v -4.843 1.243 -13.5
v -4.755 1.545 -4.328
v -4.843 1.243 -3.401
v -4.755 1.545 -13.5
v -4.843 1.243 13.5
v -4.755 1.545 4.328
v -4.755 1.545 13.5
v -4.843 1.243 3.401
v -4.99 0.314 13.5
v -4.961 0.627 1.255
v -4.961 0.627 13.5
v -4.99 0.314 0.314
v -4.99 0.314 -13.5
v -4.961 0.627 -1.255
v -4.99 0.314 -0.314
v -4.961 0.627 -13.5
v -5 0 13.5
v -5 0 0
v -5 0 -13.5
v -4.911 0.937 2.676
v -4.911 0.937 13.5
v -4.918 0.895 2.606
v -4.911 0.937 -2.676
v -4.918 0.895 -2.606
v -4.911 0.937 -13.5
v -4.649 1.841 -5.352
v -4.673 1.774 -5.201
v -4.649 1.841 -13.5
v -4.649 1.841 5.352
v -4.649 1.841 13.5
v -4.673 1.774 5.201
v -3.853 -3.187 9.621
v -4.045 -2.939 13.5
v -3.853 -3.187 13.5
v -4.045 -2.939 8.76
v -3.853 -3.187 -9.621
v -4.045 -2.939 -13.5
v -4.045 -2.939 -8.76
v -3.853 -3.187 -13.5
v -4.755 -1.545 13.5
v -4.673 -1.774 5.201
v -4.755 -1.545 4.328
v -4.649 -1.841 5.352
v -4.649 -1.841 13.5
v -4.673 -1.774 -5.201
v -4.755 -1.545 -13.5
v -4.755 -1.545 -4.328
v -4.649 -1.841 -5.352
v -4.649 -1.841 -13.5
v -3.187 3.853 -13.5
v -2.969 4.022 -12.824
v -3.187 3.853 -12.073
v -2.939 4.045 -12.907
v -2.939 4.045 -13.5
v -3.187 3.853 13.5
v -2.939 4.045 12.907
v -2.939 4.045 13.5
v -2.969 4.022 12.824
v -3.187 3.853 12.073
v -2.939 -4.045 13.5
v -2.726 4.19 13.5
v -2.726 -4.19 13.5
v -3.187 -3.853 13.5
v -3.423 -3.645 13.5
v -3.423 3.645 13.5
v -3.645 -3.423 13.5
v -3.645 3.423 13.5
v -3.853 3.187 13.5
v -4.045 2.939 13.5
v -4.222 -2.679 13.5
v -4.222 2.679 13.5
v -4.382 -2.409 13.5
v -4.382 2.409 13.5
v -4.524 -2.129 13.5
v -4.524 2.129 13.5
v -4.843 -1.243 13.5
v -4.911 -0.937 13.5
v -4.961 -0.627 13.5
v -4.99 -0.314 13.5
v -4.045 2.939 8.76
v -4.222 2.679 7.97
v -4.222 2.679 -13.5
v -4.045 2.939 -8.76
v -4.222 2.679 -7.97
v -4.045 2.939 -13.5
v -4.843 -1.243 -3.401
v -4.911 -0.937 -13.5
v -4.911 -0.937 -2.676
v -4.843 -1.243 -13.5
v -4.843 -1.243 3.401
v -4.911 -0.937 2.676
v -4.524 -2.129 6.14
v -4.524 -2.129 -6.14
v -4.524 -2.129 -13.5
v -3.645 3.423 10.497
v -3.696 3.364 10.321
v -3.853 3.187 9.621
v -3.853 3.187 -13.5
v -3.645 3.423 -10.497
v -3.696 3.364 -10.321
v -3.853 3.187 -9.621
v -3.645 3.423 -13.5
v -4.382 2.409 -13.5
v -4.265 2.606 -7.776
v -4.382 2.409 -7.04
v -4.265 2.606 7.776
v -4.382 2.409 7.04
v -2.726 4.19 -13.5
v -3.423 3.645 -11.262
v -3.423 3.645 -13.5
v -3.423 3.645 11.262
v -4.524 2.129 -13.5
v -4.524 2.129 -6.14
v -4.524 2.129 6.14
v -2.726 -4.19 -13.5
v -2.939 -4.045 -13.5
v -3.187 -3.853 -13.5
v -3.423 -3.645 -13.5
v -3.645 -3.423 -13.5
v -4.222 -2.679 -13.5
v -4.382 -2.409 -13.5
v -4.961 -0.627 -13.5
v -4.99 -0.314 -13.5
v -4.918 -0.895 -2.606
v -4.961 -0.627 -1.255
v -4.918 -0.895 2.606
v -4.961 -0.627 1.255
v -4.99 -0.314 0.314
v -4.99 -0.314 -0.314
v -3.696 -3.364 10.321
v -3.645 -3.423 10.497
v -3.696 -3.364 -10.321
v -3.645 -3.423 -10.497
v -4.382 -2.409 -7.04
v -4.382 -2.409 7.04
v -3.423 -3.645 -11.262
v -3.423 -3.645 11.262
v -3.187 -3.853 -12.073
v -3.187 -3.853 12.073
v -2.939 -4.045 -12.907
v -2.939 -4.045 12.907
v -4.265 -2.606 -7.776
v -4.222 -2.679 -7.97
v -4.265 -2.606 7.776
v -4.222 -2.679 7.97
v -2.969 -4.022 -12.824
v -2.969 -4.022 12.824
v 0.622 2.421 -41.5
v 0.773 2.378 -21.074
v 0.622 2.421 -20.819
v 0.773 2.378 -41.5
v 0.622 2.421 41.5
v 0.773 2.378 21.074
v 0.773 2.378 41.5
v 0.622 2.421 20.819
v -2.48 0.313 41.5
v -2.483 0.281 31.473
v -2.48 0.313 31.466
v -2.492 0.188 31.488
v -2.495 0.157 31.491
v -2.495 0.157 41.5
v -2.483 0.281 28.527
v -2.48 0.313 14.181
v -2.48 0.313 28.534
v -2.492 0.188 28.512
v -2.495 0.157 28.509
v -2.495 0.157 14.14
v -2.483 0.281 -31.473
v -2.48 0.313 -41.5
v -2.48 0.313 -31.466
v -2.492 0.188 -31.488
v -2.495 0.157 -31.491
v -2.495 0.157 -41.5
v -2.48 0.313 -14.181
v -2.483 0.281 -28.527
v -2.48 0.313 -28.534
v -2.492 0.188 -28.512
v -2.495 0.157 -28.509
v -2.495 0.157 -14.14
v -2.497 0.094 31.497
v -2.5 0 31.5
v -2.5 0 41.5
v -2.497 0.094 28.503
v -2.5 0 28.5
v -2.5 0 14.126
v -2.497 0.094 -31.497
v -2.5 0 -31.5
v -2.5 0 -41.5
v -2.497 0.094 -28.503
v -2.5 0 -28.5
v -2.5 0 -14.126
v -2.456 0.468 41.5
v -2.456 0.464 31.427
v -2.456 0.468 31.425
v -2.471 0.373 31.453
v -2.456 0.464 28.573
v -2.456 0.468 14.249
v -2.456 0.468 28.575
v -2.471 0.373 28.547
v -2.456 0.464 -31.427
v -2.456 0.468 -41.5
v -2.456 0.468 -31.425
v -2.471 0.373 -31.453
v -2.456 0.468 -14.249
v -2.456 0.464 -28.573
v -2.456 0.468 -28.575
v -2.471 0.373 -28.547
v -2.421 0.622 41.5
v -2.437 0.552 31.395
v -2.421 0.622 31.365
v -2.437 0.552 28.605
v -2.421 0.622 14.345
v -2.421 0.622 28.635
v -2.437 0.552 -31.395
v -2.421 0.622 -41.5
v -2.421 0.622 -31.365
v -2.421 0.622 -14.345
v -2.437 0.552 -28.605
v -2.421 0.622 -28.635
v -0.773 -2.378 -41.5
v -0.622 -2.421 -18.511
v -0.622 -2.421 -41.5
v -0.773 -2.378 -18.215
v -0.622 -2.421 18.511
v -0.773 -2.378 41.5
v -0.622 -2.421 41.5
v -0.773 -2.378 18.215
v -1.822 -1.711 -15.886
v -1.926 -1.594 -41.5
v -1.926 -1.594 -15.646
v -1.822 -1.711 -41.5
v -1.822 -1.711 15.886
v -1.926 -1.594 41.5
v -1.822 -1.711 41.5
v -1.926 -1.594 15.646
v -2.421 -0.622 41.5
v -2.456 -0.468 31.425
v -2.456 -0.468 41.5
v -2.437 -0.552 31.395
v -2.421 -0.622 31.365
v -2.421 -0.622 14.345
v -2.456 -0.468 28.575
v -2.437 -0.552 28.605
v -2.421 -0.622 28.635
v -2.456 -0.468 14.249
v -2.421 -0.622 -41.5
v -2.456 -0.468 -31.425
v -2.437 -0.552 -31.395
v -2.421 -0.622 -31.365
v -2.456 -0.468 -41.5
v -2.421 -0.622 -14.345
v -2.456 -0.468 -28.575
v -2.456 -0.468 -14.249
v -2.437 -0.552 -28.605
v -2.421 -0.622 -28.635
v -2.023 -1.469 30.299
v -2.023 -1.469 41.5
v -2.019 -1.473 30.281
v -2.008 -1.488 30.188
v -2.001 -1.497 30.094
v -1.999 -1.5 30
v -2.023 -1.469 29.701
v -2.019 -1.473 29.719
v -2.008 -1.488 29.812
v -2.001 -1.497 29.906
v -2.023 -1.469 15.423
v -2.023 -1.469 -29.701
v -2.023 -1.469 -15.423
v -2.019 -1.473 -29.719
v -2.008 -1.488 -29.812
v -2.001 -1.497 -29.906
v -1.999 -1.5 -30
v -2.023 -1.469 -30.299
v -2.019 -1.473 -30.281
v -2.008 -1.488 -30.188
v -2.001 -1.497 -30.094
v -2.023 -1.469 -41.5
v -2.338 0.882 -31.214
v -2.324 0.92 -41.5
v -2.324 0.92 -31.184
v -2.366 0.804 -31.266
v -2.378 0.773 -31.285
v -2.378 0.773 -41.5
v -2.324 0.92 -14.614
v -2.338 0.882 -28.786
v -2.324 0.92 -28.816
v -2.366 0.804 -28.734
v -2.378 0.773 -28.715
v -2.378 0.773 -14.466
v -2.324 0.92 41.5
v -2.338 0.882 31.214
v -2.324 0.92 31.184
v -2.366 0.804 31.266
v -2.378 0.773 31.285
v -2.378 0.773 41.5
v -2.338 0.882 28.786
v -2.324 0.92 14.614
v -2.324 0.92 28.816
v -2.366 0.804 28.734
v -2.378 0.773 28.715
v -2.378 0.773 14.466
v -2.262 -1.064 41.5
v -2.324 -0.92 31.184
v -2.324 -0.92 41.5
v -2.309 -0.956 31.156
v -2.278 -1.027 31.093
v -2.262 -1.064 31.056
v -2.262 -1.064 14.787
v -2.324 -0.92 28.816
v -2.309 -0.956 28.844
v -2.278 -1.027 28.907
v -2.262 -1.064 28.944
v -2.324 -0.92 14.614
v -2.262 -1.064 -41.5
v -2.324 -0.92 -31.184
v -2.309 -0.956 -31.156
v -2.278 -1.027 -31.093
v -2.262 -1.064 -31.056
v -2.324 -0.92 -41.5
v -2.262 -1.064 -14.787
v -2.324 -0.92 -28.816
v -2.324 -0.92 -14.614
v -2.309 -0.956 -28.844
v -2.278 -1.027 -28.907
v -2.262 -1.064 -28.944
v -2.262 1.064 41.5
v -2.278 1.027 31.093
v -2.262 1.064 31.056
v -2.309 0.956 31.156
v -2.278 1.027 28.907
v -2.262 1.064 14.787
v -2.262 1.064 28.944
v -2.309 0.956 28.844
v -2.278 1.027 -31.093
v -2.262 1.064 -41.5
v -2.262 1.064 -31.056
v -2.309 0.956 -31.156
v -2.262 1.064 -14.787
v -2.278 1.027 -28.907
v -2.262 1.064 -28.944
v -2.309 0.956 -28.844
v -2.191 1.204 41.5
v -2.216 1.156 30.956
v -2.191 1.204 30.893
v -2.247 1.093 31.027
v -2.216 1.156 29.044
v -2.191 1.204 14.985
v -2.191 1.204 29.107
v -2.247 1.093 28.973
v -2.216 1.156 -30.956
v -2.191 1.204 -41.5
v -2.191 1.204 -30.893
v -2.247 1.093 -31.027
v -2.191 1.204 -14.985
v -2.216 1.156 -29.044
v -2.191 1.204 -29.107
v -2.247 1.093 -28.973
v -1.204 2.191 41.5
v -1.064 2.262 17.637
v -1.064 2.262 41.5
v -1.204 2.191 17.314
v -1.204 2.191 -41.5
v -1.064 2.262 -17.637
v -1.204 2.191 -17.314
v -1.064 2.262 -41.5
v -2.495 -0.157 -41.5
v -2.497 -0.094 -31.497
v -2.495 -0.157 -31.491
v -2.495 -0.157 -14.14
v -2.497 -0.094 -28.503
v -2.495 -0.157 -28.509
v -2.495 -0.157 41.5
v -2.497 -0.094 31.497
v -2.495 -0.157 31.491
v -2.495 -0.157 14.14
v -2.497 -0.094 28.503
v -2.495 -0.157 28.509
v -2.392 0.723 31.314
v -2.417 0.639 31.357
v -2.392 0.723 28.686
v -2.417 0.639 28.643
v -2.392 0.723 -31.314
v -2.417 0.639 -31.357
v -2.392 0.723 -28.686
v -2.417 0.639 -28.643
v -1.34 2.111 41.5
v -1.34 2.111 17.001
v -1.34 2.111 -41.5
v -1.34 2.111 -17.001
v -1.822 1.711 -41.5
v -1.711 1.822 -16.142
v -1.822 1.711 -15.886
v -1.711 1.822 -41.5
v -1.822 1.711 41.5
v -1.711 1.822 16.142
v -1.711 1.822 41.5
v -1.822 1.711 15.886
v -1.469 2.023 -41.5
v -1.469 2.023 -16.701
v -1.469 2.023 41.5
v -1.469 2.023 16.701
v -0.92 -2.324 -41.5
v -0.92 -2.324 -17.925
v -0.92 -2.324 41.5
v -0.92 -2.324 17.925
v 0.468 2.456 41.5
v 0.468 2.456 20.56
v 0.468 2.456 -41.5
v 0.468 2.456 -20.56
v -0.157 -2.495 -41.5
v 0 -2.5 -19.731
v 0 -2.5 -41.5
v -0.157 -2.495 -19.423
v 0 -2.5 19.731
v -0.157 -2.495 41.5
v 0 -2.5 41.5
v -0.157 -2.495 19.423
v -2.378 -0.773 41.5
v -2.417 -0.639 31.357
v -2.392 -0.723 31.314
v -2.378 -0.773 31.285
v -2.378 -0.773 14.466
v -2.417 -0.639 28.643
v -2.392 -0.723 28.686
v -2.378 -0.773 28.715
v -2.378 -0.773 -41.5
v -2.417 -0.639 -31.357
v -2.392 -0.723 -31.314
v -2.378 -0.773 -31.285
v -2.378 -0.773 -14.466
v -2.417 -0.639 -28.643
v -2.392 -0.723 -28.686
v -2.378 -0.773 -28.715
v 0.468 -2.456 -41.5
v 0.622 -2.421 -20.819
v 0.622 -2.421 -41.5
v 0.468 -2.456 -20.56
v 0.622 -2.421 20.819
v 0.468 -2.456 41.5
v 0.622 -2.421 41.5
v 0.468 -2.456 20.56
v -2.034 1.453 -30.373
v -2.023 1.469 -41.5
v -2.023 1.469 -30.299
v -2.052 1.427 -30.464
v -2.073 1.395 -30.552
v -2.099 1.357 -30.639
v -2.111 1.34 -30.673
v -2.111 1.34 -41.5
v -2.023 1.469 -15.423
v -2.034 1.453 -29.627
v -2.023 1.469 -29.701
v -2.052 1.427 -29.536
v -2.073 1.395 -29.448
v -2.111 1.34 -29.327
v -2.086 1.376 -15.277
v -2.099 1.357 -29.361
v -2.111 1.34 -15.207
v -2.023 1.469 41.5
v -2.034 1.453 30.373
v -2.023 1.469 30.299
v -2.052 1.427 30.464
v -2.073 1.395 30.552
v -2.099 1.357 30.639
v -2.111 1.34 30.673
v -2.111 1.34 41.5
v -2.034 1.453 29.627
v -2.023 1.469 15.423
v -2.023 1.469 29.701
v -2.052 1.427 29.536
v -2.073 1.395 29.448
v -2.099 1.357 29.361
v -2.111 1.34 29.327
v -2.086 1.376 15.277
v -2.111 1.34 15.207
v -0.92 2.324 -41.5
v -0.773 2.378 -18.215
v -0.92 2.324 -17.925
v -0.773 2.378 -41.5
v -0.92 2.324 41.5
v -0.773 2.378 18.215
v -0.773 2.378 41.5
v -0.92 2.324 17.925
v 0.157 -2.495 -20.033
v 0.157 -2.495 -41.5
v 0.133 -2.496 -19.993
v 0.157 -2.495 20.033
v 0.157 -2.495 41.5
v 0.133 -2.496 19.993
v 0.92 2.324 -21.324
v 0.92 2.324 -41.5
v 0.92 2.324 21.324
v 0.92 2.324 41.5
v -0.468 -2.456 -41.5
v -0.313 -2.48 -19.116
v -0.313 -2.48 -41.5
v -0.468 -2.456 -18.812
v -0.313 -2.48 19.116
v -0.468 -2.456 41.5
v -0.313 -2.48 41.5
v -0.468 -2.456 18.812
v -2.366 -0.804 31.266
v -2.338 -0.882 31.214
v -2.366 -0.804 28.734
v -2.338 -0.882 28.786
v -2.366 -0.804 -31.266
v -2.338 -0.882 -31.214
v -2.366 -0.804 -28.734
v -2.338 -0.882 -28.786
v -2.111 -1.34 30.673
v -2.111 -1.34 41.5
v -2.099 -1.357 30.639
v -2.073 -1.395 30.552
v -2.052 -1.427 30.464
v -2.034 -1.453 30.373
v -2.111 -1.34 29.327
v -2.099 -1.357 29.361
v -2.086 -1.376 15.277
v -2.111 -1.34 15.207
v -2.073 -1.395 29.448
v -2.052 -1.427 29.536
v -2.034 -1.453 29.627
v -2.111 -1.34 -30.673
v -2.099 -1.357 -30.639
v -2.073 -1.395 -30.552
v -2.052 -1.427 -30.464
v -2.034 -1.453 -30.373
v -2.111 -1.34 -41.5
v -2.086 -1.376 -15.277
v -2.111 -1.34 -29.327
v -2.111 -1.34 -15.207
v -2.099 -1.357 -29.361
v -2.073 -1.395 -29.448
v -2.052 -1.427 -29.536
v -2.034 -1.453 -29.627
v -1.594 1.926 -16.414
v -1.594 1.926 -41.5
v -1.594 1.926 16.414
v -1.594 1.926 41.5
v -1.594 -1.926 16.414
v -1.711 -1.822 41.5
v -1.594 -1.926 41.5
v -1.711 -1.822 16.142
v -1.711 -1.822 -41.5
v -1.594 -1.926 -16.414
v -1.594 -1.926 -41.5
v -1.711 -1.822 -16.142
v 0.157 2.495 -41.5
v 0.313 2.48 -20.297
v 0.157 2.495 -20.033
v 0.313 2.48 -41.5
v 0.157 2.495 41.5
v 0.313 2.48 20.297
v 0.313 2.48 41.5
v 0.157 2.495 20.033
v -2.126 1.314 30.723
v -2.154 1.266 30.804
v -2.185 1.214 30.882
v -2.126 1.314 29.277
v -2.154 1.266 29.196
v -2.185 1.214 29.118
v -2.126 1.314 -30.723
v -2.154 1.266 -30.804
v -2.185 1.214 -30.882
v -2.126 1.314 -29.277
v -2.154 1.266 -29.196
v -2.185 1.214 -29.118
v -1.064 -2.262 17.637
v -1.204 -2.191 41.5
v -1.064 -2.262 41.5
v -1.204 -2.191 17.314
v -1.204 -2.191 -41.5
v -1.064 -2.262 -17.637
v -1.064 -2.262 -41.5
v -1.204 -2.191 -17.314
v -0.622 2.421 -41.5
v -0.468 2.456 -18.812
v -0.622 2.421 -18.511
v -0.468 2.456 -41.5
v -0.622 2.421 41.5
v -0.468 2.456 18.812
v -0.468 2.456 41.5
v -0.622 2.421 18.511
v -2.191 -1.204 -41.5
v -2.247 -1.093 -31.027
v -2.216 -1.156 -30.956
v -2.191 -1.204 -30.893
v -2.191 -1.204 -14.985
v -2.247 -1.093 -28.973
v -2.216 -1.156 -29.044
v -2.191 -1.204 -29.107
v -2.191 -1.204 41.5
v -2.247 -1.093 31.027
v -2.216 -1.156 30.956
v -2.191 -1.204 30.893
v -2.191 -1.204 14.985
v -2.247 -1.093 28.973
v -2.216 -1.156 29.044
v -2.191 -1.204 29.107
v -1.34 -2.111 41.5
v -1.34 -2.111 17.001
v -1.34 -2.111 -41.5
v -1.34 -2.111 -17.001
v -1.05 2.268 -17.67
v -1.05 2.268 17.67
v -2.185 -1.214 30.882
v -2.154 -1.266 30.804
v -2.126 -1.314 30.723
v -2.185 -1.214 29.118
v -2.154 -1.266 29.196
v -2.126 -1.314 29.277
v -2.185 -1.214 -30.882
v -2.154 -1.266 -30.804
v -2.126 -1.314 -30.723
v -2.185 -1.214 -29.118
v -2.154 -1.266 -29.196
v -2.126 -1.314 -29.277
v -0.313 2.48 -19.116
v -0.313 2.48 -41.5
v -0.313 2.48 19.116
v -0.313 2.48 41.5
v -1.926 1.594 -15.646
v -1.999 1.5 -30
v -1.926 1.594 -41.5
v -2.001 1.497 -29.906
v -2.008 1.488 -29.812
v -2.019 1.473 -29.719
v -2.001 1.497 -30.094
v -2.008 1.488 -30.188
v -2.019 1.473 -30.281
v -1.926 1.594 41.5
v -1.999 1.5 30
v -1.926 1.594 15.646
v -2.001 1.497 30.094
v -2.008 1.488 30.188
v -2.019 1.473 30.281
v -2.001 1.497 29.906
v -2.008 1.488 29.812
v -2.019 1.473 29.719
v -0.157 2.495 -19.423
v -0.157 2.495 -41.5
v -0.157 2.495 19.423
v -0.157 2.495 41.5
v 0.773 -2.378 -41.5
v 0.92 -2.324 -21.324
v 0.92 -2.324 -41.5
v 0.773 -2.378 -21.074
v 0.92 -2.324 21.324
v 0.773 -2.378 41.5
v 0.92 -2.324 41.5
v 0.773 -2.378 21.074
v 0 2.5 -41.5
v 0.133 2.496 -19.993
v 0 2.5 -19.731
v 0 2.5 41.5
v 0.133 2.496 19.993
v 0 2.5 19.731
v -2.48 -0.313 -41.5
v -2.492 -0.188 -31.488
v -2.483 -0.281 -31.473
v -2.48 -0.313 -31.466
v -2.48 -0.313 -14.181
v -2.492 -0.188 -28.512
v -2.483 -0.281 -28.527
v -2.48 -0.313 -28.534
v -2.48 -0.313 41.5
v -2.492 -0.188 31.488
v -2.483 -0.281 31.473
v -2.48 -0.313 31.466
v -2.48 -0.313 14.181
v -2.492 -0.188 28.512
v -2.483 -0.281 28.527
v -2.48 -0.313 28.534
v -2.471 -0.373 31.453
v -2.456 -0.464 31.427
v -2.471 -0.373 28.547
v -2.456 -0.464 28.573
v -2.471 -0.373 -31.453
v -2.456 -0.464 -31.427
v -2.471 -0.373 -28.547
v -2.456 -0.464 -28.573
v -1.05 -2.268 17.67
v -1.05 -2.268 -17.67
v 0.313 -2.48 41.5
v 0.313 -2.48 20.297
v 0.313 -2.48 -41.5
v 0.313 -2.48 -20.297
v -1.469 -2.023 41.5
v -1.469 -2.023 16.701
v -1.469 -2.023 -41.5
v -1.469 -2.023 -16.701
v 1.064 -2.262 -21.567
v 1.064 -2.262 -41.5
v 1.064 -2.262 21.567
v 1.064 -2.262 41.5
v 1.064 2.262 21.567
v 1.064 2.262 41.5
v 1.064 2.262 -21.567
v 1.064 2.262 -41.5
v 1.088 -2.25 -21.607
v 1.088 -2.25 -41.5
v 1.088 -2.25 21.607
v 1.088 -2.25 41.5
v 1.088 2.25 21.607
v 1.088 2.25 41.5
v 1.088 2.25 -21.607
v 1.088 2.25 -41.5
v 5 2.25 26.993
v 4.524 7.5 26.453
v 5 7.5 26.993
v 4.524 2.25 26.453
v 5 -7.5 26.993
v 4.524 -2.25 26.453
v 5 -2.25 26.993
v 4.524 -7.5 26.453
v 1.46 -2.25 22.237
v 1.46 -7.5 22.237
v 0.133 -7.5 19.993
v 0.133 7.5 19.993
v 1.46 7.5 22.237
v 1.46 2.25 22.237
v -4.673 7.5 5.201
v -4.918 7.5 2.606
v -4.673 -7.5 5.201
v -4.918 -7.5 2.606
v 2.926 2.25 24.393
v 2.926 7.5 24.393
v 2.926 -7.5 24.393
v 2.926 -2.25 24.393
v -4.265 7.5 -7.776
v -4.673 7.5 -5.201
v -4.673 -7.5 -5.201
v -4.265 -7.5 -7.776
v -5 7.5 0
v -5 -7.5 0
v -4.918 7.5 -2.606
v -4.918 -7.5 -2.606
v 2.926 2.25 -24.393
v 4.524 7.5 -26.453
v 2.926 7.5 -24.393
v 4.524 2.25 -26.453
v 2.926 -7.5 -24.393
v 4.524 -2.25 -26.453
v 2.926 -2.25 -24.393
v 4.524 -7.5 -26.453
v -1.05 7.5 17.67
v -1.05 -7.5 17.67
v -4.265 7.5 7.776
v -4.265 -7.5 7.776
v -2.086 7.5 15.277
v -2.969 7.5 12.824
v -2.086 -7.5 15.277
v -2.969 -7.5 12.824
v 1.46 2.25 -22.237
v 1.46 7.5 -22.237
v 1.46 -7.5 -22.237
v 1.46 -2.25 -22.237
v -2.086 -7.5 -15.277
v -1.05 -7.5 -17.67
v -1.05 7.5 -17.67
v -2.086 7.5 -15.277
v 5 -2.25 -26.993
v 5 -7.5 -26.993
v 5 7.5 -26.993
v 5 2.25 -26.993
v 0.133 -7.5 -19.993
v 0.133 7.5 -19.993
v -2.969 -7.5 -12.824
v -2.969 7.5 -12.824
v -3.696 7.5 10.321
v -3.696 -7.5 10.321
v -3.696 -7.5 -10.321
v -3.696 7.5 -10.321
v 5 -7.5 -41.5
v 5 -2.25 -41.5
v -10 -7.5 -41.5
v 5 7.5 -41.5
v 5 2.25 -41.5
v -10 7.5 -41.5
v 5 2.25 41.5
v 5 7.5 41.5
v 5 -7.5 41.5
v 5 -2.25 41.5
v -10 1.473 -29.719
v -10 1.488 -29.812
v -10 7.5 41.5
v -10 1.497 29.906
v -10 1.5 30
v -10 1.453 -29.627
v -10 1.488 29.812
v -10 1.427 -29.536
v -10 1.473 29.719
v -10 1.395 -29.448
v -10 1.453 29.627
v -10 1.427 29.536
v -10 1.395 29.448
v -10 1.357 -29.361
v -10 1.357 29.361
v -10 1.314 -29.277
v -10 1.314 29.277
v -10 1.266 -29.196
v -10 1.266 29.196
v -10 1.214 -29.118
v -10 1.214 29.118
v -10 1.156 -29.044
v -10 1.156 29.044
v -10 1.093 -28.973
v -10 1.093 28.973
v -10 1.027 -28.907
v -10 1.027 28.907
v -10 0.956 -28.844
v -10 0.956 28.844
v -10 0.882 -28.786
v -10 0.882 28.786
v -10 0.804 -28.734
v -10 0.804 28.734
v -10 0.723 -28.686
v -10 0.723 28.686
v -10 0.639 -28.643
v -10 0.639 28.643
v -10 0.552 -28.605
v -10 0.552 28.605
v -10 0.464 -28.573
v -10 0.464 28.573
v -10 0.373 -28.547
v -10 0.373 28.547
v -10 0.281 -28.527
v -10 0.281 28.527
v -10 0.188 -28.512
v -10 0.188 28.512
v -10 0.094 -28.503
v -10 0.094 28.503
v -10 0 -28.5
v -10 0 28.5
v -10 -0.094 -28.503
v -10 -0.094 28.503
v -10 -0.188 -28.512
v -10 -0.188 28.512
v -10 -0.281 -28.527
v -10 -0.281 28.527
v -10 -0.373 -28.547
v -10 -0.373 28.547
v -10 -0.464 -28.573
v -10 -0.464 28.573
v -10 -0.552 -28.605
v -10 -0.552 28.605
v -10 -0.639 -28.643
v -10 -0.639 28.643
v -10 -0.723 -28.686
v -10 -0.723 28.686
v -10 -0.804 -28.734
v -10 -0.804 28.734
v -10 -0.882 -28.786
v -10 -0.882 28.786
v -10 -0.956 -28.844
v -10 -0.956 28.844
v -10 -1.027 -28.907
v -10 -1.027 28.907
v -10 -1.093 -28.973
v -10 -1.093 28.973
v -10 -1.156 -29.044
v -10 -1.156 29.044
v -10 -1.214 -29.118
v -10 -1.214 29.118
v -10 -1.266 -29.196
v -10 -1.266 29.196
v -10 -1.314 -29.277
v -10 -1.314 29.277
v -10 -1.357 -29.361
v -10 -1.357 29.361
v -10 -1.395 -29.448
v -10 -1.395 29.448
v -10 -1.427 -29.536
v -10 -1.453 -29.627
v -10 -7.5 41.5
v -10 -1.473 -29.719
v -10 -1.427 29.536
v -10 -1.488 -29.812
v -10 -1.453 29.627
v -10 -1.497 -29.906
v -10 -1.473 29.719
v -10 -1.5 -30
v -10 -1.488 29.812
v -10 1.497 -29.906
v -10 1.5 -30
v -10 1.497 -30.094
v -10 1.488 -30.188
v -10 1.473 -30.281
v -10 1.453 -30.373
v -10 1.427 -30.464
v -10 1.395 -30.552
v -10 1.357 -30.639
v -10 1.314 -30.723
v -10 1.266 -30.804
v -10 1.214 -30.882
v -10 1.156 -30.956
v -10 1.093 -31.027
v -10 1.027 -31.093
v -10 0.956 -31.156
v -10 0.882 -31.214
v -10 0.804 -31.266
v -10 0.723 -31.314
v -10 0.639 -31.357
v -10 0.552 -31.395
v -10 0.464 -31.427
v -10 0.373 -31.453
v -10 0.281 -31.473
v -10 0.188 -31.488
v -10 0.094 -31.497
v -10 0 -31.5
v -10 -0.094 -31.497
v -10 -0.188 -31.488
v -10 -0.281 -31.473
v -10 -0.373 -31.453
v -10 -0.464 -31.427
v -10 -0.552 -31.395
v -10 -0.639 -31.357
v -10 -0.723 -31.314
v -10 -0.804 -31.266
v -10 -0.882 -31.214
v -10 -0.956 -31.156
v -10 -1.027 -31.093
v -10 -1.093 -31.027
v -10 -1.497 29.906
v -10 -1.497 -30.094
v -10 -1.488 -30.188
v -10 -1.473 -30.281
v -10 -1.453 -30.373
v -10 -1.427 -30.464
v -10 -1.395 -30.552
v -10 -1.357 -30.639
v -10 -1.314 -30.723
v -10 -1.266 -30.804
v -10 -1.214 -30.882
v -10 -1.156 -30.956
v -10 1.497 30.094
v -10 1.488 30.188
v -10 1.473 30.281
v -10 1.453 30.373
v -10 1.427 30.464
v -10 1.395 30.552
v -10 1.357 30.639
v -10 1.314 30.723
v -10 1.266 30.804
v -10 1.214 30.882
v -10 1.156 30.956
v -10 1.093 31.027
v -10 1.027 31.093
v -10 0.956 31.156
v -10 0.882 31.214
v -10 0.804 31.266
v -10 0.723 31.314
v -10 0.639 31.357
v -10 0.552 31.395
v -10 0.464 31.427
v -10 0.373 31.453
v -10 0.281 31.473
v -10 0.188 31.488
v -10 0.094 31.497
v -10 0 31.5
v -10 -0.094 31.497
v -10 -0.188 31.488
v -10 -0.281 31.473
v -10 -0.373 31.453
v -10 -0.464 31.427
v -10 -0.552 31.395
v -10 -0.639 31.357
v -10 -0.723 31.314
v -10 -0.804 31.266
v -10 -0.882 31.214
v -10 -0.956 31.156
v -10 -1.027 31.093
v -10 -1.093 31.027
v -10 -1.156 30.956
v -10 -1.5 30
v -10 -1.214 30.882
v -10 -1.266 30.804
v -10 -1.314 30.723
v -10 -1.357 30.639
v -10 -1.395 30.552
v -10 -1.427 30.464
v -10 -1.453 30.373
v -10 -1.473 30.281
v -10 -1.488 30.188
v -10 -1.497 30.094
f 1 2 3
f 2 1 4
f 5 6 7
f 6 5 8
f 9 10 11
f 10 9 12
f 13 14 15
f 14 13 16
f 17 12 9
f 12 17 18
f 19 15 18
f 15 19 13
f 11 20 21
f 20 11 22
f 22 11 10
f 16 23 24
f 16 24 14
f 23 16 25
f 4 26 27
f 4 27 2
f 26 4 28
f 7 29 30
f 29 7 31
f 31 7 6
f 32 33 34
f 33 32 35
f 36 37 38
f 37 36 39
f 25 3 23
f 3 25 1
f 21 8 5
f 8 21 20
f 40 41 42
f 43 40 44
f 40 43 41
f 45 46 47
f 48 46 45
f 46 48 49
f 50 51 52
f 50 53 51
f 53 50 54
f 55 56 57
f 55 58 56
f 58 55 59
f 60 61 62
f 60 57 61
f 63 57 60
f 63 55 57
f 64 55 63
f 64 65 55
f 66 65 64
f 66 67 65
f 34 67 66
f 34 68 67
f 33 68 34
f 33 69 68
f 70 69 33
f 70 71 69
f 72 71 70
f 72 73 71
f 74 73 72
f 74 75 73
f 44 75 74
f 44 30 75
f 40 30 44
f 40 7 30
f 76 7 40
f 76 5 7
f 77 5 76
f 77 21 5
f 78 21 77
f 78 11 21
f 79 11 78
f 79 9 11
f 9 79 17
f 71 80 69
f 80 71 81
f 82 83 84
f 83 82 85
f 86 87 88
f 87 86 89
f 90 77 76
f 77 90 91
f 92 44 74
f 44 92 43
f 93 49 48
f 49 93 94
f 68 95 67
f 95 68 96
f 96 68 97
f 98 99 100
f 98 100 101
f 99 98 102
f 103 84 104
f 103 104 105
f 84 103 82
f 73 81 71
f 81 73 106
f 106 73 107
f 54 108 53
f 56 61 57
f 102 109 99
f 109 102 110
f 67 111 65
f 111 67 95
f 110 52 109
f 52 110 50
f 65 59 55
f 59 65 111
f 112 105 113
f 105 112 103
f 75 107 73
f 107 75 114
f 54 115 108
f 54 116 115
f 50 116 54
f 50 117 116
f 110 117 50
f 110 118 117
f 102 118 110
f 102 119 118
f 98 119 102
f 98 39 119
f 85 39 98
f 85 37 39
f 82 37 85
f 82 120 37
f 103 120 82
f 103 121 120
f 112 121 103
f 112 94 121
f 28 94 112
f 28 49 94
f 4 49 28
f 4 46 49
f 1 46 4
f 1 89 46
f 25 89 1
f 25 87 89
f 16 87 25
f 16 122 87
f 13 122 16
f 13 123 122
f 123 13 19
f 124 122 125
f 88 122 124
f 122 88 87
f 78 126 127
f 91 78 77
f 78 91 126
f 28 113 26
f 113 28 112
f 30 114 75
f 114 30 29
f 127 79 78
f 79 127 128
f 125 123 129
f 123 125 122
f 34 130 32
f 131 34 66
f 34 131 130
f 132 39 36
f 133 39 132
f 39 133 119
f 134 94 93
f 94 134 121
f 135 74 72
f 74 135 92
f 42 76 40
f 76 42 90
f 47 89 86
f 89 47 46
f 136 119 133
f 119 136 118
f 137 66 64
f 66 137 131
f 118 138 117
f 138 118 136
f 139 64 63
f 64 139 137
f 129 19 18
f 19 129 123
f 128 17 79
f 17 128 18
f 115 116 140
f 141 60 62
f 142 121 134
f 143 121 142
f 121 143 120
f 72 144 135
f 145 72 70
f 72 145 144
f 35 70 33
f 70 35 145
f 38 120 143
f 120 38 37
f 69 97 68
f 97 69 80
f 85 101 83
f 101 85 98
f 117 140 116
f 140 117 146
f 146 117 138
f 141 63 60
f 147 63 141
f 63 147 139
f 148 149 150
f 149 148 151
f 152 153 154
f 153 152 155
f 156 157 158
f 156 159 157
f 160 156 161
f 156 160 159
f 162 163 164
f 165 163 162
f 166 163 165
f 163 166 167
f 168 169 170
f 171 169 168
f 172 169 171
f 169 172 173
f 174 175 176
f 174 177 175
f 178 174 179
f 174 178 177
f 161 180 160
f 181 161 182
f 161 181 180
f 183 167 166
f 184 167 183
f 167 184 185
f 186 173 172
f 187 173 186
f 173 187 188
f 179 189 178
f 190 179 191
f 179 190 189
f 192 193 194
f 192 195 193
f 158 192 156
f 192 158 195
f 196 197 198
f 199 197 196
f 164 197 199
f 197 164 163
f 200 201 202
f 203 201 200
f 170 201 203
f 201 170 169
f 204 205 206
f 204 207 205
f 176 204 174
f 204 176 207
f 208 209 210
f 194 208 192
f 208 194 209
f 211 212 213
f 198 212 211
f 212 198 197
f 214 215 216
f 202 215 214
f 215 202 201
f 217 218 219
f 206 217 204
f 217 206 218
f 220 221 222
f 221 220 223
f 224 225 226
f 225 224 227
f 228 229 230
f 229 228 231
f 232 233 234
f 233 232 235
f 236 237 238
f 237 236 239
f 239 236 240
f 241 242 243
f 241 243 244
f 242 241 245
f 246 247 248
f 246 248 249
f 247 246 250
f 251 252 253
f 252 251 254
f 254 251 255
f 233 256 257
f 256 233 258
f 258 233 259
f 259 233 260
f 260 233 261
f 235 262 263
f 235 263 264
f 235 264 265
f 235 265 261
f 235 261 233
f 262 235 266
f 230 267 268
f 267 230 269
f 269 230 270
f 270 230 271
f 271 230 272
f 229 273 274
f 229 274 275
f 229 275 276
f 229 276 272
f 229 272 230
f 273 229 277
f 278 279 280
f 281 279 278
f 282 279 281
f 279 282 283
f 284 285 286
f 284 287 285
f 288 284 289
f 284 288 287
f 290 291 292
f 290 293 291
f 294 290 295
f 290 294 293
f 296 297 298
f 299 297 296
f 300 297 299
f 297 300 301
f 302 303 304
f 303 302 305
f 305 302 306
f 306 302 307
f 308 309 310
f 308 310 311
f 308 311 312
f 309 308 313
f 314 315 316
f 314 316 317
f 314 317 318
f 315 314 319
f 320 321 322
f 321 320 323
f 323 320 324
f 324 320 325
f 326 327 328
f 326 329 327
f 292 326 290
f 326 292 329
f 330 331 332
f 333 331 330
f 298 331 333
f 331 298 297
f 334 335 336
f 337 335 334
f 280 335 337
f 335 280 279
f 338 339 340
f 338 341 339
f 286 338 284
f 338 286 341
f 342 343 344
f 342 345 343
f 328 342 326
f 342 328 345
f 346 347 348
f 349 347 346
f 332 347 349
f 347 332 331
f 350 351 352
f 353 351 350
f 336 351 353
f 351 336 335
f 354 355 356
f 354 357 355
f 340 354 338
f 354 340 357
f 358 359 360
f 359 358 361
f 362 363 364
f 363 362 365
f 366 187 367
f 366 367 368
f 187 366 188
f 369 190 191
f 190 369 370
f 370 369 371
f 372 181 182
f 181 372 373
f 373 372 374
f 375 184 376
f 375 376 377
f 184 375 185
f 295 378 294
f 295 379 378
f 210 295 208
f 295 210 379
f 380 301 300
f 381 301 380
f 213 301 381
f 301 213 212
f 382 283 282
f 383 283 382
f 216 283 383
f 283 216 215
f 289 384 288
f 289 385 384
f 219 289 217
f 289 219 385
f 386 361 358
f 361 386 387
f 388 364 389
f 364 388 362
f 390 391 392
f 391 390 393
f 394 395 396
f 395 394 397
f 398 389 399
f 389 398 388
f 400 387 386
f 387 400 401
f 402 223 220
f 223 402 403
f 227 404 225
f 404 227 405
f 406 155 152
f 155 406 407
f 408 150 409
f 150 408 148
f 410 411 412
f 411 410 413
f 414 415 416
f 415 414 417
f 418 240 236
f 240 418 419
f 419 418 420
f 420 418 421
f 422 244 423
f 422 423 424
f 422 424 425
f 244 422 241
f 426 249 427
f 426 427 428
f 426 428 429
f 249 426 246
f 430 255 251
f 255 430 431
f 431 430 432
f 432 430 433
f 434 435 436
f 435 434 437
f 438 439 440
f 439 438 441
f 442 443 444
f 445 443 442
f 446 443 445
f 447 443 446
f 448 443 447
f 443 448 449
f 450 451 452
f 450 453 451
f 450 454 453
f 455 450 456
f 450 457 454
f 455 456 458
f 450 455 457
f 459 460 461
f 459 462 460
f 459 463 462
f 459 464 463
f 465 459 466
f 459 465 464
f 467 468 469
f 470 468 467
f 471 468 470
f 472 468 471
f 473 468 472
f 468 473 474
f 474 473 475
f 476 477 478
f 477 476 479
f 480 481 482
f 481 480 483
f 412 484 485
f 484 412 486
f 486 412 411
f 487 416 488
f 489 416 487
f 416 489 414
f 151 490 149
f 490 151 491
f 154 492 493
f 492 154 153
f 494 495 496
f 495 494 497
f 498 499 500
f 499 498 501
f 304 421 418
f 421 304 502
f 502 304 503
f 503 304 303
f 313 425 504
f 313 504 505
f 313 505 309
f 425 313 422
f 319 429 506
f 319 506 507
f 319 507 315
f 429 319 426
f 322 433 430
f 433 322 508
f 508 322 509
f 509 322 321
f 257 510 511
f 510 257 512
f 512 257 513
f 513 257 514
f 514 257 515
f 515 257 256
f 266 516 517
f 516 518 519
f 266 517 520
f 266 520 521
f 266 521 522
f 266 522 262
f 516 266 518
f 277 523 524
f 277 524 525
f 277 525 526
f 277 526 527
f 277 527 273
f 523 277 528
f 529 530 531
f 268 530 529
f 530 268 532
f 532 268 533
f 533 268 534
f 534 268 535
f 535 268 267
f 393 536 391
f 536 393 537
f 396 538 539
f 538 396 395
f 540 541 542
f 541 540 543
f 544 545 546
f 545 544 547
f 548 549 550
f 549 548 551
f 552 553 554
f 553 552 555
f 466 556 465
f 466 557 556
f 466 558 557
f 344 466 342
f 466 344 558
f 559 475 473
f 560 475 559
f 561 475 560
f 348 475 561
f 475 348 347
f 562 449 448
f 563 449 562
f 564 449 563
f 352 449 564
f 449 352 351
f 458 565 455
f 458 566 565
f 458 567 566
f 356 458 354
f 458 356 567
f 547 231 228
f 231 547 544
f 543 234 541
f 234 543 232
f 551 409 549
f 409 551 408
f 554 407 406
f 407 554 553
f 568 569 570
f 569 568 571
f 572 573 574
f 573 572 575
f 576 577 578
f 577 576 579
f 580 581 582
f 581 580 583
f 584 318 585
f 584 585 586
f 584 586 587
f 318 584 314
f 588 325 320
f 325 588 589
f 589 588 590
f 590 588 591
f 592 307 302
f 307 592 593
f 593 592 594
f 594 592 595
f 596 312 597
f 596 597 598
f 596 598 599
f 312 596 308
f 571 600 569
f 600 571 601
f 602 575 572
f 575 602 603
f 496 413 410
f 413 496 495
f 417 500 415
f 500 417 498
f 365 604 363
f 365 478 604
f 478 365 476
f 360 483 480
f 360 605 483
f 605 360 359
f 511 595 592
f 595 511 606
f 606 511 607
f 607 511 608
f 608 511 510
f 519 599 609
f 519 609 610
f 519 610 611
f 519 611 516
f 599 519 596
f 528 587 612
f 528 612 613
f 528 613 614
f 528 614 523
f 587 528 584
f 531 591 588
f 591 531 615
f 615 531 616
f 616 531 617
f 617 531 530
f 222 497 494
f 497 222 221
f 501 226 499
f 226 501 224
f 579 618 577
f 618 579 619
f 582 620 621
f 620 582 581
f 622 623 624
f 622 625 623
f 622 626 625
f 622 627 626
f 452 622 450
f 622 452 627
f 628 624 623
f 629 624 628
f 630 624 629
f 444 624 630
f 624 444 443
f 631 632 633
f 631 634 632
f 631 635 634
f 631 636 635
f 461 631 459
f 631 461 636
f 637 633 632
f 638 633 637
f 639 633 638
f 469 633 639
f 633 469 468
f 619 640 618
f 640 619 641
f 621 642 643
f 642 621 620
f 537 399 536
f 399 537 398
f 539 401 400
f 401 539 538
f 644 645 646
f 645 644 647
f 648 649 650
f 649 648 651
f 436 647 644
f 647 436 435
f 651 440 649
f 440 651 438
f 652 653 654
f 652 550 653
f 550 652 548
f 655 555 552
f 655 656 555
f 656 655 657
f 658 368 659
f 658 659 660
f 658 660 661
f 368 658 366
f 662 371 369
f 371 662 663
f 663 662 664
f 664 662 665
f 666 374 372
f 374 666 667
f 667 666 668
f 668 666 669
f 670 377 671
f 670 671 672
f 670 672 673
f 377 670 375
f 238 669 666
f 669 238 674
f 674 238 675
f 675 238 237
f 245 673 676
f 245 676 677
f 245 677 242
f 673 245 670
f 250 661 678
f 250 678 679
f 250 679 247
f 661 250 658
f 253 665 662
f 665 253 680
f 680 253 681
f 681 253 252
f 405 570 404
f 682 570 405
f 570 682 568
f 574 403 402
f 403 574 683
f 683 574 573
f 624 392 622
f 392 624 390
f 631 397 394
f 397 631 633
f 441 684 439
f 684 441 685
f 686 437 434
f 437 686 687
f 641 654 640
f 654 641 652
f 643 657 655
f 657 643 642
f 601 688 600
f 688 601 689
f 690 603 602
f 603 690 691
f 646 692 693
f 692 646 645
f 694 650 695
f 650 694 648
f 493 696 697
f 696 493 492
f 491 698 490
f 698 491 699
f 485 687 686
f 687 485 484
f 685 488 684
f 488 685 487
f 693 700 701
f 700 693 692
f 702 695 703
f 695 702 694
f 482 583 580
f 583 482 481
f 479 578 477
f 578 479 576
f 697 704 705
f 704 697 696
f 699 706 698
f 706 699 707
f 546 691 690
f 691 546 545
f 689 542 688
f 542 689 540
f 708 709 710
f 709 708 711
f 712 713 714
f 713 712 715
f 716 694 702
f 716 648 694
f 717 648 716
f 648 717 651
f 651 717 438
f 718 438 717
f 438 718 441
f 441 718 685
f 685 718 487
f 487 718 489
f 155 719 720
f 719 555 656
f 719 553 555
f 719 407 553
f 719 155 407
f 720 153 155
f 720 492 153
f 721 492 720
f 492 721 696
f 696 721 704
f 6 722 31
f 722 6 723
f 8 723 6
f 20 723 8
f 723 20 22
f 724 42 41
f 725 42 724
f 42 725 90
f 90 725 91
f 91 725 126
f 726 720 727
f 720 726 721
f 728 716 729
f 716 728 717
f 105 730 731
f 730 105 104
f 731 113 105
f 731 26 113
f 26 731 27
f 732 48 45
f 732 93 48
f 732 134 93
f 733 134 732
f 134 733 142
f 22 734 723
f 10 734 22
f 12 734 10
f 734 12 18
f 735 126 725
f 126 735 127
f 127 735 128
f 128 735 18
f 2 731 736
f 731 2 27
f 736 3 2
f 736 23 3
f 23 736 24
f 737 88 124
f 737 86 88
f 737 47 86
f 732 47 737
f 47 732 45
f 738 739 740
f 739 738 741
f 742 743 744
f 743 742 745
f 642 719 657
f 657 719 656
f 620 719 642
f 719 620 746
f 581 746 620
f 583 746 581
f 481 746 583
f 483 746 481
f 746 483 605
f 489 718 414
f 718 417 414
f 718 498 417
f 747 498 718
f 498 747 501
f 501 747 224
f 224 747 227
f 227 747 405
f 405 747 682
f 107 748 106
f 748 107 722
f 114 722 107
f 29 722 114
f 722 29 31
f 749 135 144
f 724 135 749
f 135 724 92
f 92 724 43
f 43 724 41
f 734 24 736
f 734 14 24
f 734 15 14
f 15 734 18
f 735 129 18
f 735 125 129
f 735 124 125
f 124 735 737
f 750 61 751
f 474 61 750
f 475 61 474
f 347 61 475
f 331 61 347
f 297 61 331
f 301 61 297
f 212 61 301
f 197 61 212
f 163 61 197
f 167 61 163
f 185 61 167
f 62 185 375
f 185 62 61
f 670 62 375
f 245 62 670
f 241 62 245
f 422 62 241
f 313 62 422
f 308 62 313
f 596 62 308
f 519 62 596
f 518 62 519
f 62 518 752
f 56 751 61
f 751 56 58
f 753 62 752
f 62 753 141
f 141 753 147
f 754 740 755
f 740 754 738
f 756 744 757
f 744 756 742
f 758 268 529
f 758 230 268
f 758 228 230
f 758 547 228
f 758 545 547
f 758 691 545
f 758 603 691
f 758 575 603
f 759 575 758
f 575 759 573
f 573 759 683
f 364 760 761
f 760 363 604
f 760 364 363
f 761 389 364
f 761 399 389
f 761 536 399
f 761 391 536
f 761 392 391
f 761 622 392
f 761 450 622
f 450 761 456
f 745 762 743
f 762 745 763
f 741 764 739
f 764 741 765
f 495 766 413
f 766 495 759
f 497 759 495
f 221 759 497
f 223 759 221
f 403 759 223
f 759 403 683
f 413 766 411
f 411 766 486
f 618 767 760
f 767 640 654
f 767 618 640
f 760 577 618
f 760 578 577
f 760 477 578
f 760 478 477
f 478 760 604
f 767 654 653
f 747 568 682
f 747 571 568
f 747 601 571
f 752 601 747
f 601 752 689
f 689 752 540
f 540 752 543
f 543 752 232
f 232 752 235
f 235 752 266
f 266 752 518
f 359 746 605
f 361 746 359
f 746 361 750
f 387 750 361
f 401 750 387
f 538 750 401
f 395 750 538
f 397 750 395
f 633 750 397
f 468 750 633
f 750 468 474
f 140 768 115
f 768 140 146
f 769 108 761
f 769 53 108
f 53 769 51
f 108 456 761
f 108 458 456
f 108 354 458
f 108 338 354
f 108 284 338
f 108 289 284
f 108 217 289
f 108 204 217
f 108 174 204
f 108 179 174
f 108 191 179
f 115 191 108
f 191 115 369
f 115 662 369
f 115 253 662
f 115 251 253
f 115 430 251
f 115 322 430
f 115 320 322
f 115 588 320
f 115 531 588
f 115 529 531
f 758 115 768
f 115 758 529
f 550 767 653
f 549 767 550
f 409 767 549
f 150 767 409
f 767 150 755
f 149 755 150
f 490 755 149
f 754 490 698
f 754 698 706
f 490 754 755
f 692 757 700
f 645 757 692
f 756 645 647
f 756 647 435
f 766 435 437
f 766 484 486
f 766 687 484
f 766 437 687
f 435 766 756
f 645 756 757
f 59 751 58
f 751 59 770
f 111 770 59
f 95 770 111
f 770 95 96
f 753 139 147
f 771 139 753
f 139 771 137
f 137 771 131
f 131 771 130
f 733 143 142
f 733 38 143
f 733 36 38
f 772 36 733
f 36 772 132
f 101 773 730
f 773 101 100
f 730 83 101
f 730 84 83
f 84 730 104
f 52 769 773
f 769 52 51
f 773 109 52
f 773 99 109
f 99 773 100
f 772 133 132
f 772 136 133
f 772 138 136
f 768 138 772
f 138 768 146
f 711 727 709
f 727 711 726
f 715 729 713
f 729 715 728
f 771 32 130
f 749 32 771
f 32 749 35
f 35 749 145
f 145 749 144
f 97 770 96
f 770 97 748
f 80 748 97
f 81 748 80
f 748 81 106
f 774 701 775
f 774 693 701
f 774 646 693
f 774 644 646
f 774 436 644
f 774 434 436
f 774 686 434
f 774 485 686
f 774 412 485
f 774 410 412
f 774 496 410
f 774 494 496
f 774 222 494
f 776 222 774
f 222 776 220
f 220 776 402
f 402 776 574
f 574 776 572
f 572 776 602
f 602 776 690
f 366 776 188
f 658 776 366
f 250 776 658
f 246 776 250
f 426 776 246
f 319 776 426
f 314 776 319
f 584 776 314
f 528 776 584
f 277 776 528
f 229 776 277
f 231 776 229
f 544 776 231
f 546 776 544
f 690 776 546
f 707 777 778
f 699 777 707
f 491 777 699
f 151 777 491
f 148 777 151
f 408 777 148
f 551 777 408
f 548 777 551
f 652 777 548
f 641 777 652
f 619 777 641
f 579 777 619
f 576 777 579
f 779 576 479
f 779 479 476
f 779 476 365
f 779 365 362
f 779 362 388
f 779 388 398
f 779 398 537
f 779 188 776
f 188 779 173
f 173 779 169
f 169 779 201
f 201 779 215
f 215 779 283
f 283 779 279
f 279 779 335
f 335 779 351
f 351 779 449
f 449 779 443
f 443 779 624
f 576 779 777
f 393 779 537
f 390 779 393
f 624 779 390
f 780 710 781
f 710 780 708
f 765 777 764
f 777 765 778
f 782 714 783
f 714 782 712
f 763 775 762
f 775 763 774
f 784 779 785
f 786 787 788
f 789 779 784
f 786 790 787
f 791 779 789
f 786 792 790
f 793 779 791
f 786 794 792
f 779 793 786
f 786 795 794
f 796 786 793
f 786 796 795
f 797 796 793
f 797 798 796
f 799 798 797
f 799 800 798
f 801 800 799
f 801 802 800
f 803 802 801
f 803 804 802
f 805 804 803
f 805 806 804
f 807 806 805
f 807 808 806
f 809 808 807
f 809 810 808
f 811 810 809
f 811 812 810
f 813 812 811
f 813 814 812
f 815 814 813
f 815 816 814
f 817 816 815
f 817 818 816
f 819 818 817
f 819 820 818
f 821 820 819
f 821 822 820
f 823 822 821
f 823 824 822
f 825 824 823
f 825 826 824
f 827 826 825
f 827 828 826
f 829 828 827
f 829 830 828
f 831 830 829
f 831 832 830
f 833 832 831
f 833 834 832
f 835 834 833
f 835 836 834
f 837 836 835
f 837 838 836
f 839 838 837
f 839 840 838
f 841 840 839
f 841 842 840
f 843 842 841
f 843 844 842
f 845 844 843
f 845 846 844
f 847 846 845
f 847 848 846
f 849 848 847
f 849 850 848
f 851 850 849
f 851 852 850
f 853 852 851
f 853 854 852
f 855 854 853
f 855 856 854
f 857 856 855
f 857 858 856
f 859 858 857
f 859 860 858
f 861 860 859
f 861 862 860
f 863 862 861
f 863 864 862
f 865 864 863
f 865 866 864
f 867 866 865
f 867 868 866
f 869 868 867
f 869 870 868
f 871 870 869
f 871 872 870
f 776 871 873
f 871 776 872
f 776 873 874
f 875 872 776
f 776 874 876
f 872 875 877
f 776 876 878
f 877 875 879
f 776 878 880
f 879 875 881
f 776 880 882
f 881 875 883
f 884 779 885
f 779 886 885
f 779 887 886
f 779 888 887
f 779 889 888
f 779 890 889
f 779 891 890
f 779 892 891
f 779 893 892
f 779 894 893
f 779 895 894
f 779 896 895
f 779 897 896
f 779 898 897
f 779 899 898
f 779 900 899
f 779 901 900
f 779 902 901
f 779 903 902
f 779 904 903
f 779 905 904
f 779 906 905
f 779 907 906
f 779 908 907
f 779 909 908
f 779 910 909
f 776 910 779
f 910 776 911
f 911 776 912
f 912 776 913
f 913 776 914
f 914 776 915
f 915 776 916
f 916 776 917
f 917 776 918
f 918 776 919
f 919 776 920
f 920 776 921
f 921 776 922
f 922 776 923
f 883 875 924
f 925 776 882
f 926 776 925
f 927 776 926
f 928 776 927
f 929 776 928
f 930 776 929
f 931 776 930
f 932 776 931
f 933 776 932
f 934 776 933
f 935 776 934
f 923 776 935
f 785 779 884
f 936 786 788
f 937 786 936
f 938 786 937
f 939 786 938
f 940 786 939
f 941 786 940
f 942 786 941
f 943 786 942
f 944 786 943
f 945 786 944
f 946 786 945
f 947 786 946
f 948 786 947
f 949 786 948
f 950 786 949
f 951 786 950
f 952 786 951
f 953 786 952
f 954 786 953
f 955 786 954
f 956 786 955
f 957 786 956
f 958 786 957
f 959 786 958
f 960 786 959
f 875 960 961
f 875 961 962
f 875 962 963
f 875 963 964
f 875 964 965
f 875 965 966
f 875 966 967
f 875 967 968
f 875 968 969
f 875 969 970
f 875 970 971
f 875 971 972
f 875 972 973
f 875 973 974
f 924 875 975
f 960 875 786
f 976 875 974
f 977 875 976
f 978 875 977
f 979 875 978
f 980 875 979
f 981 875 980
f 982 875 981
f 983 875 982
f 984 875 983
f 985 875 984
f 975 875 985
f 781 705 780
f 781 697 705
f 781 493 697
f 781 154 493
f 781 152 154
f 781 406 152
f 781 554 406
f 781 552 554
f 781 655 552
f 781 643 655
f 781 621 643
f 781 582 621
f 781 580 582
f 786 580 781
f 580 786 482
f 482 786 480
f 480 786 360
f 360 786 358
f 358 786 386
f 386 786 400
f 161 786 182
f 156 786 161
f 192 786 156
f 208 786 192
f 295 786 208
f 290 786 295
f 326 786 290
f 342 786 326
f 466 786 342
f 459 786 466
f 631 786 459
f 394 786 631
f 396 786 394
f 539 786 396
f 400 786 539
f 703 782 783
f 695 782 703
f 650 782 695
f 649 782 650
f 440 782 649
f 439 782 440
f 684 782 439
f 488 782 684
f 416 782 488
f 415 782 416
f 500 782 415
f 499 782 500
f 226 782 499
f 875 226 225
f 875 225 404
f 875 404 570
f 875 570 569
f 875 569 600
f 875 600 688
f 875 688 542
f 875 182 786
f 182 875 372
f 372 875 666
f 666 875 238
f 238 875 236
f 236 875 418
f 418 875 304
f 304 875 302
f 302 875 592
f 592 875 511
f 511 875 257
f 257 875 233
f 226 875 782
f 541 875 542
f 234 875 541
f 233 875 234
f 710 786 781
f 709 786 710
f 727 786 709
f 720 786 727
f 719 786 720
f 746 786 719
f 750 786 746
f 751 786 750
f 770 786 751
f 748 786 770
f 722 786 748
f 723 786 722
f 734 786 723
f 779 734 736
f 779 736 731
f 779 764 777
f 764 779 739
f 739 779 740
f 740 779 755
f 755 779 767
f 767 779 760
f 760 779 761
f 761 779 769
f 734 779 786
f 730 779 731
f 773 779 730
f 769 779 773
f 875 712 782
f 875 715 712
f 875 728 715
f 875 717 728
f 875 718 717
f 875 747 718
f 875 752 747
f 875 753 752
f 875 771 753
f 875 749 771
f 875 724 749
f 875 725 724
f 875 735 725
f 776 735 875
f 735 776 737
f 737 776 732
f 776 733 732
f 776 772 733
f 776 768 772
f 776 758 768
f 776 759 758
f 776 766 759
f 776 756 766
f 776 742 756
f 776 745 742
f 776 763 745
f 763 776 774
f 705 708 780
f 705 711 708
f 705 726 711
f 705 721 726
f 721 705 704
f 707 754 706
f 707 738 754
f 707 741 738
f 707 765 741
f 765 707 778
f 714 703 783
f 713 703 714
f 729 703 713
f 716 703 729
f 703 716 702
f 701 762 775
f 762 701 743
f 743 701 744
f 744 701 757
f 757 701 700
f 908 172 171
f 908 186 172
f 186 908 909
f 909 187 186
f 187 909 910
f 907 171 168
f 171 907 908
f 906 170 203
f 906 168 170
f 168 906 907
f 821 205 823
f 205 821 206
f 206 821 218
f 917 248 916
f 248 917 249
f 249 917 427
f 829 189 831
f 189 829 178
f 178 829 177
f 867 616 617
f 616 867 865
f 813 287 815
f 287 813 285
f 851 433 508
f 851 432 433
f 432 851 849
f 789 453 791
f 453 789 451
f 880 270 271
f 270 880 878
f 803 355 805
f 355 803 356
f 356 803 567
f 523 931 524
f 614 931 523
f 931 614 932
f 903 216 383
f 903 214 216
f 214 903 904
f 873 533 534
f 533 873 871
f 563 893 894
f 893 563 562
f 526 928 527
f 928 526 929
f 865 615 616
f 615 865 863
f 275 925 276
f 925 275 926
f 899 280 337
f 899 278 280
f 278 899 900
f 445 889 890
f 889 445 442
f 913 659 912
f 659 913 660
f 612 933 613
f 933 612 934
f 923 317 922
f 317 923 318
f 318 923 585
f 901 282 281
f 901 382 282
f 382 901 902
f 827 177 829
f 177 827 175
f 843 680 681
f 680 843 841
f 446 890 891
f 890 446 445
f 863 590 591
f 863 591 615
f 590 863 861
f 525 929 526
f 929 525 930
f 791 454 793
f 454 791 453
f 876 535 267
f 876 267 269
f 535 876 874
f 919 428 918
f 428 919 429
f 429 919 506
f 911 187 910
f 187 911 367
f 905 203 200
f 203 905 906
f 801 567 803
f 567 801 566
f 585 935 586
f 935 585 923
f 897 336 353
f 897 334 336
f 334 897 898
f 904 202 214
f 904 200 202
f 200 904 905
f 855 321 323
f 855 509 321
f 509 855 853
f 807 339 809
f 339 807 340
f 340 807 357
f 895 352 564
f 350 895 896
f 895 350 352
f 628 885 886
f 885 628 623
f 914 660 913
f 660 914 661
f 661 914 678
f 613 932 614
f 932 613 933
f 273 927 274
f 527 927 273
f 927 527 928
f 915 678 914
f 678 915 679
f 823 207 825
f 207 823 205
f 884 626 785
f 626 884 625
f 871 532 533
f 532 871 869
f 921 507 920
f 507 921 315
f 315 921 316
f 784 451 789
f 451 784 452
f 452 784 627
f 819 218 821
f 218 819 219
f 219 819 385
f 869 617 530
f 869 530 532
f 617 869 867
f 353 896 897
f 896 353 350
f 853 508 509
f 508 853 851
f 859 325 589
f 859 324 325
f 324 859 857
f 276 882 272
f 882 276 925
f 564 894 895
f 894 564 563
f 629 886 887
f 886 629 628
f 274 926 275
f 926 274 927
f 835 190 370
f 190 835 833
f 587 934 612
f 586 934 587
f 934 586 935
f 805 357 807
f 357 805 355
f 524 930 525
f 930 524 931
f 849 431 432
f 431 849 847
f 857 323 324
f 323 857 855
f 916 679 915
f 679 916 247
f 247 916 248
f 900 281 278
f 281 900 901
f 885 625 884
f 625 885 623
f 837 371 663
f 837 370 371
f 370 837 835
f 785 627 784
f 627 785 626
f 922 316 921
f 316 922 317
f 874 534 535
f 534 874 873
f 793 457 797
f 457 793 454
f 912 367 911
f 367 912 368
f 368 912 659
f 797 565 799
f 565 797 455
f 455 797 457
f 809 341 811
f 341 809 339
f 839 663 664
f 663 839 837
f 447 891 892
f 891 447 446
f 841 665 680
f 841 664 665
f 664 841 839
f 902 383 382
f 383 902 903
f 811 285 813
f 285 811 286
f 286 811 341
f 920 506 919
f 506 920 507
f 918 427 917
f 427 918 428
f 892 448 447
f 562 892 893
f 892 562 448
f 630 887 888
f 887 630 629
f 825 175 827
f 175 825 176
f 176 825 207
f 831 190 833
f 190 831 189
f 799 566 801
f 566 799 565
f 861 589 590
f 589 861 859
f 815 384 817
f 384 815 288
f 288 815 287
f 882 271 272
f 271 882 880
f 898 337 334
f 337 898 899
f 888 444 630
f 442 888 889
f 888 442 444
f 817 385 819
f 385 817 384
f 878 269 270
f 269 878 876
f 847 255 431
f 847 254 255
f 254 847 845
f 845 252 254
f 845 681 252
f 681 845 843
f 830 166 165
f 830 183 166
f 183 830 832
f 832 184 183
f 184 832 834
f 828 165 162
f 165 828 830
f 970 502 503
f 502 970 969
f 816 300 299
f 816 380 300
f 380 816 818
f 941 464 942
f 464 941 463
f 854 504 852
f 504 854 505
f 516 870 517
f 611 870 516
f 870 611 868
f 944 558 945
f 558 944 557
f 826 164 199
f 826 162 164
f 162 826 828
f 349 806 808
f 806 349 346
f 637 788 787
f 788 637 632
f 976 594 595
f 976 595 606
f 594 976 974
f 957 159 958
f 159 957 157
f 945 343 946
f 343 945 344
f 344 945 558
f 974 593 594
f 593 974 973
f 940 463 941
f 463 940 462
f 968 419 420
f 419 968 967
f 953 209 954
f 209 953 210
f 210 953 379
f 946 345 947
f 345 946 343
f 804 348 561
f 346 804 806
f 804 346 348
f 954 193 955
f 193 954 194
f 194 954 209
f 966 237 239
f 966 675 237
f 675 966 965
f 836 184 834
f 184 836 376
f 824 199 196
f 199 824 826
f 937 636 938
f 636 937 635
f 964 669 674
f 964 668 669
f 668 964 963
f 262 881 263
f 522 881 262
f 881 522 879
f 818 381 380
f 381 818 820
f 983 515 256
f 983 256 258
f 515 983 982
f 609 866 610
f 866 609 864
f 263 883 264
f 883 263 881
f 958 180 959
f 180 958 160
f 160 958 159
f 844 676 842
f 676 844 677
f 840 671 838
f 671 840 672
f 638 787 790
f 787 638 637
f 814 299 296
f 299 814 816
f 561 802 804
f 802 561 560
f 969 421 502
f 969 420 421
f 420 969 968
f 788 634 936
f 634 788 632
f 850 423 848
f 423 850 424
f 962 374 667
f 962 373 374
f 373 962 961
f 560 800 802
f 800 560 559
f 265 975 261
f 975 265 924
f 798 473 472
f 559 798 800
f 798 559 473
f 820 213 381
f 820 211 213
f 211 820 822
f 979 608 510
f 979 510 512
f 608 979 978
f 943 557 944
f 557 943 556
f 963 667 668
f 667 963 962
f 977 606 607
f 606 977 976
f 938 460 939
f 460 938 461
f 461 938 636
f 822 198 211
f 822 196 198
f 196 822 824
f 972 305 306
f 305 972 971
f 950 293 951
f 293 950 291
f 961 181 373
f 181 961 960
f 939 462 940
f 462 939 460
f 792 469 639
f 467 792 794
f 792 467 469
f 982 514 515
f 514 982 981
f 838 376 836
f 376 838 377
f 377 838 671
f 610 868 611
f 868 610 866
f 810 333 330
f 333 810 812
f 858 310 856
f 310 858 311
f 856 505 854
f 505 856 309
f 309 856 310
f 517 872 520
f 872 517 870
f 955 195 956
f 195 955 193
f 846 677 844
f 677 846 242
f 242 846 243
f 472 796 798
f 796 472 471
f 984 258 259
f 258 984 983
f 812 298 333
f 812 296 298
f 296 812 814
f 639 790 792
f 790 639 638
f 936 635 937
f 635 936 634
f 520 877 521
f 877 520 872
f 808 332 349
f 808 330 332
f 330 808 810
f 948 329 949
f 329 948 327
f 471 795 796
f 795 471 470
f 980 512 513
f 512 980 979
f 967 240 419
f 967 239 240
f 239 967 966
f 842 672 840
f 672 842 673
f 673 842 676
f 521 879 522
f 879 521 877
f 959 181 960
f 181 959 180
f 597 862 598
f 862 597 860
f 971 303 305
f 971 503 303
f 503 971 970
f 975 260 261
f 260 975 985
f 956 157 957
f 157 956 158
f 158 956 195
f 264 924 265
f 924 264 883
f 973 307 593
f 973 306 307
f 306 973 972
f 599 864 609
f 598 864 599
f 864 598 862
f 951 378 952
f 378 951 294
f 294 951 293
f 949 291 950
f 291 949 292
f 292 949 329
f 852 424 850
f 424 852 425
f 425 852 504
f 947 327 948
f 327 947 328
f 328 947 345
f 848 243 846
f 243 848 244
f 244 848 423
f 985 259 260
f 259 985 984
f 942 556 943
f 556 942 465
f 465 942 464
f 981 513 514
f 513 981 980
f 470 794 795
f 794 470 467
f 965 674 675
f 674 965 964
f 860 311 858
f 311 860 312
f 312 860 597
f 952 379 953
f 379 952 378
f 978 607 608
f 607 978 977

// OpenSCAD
//To hold my transmitter in it's case
tolerance=.001;
$fn=100;
bracketDiameter=5;
DHUWidth=27;
DHUDiameter=10;
DHUHeight=5;
wallThickness=5;
baseHeight=bracketDiameter+DHUHeight+wallThickness;
width=bracketDiameter+2*wallThickness;
//length must be less than 83mm
length=83;
overhangCylinder=length;
screwDiameter=3;
screwCenters=length-23;

module bracket()
{
difference()
{
union()
{
//base
translate([0,0,-bracketDiameter/2])
cube([length,width,baseHeight],true);

}
translate([0,0,baseHeight/2-DHUHeight/2])
//DHUBracket cutout
cube([DHUWidth,width+tolerance,baseHeight],true);
rotate([0,90,0])
{
//bit for DHT-U mount to slot in
cylinder(DHUWidth,DHUDiameter/2,DHUDiameter/2,true);
//center cylinder cutout
cylinder(length+tolerance,bracketDiameter/2,bracketDiameter/2,true);
//slot slighly smaller than bracketDiameter
}
translate([0,0,(bracketDiameter/2+wallThickness)/2+tolerance])
cube([length+tolerance,bracketDiameter-.5,bracketDiameter/2+wallThickness+tolerance],true);

//screw holes
translate([screwCenters/2,0,0])
cylinder(baseHeight+bracketDiameter,screwDiameter/2,screwDiameter/2,true);

//screw holes
translate([-screwCenters/2,0,0])
cylinder(baseHeight+bracketDiameter,screwDiameter/2,screwDiameter/2,true);

//fillet edge for printing in strongest orientation
difference()
{
translate([0,0,overhangCylinder/2-DHUDiameter/2])
rotate([90,0,0])
#cylinder(width+tolerance,overhangCylinder/2,overhangCylinder/2,true);

translate([0,0,-DHUDiameter/2-baseHeight/2])
#cube([length,width,baseHeight],true);
}
}
}
rotate([0,90,0])
bracket();
